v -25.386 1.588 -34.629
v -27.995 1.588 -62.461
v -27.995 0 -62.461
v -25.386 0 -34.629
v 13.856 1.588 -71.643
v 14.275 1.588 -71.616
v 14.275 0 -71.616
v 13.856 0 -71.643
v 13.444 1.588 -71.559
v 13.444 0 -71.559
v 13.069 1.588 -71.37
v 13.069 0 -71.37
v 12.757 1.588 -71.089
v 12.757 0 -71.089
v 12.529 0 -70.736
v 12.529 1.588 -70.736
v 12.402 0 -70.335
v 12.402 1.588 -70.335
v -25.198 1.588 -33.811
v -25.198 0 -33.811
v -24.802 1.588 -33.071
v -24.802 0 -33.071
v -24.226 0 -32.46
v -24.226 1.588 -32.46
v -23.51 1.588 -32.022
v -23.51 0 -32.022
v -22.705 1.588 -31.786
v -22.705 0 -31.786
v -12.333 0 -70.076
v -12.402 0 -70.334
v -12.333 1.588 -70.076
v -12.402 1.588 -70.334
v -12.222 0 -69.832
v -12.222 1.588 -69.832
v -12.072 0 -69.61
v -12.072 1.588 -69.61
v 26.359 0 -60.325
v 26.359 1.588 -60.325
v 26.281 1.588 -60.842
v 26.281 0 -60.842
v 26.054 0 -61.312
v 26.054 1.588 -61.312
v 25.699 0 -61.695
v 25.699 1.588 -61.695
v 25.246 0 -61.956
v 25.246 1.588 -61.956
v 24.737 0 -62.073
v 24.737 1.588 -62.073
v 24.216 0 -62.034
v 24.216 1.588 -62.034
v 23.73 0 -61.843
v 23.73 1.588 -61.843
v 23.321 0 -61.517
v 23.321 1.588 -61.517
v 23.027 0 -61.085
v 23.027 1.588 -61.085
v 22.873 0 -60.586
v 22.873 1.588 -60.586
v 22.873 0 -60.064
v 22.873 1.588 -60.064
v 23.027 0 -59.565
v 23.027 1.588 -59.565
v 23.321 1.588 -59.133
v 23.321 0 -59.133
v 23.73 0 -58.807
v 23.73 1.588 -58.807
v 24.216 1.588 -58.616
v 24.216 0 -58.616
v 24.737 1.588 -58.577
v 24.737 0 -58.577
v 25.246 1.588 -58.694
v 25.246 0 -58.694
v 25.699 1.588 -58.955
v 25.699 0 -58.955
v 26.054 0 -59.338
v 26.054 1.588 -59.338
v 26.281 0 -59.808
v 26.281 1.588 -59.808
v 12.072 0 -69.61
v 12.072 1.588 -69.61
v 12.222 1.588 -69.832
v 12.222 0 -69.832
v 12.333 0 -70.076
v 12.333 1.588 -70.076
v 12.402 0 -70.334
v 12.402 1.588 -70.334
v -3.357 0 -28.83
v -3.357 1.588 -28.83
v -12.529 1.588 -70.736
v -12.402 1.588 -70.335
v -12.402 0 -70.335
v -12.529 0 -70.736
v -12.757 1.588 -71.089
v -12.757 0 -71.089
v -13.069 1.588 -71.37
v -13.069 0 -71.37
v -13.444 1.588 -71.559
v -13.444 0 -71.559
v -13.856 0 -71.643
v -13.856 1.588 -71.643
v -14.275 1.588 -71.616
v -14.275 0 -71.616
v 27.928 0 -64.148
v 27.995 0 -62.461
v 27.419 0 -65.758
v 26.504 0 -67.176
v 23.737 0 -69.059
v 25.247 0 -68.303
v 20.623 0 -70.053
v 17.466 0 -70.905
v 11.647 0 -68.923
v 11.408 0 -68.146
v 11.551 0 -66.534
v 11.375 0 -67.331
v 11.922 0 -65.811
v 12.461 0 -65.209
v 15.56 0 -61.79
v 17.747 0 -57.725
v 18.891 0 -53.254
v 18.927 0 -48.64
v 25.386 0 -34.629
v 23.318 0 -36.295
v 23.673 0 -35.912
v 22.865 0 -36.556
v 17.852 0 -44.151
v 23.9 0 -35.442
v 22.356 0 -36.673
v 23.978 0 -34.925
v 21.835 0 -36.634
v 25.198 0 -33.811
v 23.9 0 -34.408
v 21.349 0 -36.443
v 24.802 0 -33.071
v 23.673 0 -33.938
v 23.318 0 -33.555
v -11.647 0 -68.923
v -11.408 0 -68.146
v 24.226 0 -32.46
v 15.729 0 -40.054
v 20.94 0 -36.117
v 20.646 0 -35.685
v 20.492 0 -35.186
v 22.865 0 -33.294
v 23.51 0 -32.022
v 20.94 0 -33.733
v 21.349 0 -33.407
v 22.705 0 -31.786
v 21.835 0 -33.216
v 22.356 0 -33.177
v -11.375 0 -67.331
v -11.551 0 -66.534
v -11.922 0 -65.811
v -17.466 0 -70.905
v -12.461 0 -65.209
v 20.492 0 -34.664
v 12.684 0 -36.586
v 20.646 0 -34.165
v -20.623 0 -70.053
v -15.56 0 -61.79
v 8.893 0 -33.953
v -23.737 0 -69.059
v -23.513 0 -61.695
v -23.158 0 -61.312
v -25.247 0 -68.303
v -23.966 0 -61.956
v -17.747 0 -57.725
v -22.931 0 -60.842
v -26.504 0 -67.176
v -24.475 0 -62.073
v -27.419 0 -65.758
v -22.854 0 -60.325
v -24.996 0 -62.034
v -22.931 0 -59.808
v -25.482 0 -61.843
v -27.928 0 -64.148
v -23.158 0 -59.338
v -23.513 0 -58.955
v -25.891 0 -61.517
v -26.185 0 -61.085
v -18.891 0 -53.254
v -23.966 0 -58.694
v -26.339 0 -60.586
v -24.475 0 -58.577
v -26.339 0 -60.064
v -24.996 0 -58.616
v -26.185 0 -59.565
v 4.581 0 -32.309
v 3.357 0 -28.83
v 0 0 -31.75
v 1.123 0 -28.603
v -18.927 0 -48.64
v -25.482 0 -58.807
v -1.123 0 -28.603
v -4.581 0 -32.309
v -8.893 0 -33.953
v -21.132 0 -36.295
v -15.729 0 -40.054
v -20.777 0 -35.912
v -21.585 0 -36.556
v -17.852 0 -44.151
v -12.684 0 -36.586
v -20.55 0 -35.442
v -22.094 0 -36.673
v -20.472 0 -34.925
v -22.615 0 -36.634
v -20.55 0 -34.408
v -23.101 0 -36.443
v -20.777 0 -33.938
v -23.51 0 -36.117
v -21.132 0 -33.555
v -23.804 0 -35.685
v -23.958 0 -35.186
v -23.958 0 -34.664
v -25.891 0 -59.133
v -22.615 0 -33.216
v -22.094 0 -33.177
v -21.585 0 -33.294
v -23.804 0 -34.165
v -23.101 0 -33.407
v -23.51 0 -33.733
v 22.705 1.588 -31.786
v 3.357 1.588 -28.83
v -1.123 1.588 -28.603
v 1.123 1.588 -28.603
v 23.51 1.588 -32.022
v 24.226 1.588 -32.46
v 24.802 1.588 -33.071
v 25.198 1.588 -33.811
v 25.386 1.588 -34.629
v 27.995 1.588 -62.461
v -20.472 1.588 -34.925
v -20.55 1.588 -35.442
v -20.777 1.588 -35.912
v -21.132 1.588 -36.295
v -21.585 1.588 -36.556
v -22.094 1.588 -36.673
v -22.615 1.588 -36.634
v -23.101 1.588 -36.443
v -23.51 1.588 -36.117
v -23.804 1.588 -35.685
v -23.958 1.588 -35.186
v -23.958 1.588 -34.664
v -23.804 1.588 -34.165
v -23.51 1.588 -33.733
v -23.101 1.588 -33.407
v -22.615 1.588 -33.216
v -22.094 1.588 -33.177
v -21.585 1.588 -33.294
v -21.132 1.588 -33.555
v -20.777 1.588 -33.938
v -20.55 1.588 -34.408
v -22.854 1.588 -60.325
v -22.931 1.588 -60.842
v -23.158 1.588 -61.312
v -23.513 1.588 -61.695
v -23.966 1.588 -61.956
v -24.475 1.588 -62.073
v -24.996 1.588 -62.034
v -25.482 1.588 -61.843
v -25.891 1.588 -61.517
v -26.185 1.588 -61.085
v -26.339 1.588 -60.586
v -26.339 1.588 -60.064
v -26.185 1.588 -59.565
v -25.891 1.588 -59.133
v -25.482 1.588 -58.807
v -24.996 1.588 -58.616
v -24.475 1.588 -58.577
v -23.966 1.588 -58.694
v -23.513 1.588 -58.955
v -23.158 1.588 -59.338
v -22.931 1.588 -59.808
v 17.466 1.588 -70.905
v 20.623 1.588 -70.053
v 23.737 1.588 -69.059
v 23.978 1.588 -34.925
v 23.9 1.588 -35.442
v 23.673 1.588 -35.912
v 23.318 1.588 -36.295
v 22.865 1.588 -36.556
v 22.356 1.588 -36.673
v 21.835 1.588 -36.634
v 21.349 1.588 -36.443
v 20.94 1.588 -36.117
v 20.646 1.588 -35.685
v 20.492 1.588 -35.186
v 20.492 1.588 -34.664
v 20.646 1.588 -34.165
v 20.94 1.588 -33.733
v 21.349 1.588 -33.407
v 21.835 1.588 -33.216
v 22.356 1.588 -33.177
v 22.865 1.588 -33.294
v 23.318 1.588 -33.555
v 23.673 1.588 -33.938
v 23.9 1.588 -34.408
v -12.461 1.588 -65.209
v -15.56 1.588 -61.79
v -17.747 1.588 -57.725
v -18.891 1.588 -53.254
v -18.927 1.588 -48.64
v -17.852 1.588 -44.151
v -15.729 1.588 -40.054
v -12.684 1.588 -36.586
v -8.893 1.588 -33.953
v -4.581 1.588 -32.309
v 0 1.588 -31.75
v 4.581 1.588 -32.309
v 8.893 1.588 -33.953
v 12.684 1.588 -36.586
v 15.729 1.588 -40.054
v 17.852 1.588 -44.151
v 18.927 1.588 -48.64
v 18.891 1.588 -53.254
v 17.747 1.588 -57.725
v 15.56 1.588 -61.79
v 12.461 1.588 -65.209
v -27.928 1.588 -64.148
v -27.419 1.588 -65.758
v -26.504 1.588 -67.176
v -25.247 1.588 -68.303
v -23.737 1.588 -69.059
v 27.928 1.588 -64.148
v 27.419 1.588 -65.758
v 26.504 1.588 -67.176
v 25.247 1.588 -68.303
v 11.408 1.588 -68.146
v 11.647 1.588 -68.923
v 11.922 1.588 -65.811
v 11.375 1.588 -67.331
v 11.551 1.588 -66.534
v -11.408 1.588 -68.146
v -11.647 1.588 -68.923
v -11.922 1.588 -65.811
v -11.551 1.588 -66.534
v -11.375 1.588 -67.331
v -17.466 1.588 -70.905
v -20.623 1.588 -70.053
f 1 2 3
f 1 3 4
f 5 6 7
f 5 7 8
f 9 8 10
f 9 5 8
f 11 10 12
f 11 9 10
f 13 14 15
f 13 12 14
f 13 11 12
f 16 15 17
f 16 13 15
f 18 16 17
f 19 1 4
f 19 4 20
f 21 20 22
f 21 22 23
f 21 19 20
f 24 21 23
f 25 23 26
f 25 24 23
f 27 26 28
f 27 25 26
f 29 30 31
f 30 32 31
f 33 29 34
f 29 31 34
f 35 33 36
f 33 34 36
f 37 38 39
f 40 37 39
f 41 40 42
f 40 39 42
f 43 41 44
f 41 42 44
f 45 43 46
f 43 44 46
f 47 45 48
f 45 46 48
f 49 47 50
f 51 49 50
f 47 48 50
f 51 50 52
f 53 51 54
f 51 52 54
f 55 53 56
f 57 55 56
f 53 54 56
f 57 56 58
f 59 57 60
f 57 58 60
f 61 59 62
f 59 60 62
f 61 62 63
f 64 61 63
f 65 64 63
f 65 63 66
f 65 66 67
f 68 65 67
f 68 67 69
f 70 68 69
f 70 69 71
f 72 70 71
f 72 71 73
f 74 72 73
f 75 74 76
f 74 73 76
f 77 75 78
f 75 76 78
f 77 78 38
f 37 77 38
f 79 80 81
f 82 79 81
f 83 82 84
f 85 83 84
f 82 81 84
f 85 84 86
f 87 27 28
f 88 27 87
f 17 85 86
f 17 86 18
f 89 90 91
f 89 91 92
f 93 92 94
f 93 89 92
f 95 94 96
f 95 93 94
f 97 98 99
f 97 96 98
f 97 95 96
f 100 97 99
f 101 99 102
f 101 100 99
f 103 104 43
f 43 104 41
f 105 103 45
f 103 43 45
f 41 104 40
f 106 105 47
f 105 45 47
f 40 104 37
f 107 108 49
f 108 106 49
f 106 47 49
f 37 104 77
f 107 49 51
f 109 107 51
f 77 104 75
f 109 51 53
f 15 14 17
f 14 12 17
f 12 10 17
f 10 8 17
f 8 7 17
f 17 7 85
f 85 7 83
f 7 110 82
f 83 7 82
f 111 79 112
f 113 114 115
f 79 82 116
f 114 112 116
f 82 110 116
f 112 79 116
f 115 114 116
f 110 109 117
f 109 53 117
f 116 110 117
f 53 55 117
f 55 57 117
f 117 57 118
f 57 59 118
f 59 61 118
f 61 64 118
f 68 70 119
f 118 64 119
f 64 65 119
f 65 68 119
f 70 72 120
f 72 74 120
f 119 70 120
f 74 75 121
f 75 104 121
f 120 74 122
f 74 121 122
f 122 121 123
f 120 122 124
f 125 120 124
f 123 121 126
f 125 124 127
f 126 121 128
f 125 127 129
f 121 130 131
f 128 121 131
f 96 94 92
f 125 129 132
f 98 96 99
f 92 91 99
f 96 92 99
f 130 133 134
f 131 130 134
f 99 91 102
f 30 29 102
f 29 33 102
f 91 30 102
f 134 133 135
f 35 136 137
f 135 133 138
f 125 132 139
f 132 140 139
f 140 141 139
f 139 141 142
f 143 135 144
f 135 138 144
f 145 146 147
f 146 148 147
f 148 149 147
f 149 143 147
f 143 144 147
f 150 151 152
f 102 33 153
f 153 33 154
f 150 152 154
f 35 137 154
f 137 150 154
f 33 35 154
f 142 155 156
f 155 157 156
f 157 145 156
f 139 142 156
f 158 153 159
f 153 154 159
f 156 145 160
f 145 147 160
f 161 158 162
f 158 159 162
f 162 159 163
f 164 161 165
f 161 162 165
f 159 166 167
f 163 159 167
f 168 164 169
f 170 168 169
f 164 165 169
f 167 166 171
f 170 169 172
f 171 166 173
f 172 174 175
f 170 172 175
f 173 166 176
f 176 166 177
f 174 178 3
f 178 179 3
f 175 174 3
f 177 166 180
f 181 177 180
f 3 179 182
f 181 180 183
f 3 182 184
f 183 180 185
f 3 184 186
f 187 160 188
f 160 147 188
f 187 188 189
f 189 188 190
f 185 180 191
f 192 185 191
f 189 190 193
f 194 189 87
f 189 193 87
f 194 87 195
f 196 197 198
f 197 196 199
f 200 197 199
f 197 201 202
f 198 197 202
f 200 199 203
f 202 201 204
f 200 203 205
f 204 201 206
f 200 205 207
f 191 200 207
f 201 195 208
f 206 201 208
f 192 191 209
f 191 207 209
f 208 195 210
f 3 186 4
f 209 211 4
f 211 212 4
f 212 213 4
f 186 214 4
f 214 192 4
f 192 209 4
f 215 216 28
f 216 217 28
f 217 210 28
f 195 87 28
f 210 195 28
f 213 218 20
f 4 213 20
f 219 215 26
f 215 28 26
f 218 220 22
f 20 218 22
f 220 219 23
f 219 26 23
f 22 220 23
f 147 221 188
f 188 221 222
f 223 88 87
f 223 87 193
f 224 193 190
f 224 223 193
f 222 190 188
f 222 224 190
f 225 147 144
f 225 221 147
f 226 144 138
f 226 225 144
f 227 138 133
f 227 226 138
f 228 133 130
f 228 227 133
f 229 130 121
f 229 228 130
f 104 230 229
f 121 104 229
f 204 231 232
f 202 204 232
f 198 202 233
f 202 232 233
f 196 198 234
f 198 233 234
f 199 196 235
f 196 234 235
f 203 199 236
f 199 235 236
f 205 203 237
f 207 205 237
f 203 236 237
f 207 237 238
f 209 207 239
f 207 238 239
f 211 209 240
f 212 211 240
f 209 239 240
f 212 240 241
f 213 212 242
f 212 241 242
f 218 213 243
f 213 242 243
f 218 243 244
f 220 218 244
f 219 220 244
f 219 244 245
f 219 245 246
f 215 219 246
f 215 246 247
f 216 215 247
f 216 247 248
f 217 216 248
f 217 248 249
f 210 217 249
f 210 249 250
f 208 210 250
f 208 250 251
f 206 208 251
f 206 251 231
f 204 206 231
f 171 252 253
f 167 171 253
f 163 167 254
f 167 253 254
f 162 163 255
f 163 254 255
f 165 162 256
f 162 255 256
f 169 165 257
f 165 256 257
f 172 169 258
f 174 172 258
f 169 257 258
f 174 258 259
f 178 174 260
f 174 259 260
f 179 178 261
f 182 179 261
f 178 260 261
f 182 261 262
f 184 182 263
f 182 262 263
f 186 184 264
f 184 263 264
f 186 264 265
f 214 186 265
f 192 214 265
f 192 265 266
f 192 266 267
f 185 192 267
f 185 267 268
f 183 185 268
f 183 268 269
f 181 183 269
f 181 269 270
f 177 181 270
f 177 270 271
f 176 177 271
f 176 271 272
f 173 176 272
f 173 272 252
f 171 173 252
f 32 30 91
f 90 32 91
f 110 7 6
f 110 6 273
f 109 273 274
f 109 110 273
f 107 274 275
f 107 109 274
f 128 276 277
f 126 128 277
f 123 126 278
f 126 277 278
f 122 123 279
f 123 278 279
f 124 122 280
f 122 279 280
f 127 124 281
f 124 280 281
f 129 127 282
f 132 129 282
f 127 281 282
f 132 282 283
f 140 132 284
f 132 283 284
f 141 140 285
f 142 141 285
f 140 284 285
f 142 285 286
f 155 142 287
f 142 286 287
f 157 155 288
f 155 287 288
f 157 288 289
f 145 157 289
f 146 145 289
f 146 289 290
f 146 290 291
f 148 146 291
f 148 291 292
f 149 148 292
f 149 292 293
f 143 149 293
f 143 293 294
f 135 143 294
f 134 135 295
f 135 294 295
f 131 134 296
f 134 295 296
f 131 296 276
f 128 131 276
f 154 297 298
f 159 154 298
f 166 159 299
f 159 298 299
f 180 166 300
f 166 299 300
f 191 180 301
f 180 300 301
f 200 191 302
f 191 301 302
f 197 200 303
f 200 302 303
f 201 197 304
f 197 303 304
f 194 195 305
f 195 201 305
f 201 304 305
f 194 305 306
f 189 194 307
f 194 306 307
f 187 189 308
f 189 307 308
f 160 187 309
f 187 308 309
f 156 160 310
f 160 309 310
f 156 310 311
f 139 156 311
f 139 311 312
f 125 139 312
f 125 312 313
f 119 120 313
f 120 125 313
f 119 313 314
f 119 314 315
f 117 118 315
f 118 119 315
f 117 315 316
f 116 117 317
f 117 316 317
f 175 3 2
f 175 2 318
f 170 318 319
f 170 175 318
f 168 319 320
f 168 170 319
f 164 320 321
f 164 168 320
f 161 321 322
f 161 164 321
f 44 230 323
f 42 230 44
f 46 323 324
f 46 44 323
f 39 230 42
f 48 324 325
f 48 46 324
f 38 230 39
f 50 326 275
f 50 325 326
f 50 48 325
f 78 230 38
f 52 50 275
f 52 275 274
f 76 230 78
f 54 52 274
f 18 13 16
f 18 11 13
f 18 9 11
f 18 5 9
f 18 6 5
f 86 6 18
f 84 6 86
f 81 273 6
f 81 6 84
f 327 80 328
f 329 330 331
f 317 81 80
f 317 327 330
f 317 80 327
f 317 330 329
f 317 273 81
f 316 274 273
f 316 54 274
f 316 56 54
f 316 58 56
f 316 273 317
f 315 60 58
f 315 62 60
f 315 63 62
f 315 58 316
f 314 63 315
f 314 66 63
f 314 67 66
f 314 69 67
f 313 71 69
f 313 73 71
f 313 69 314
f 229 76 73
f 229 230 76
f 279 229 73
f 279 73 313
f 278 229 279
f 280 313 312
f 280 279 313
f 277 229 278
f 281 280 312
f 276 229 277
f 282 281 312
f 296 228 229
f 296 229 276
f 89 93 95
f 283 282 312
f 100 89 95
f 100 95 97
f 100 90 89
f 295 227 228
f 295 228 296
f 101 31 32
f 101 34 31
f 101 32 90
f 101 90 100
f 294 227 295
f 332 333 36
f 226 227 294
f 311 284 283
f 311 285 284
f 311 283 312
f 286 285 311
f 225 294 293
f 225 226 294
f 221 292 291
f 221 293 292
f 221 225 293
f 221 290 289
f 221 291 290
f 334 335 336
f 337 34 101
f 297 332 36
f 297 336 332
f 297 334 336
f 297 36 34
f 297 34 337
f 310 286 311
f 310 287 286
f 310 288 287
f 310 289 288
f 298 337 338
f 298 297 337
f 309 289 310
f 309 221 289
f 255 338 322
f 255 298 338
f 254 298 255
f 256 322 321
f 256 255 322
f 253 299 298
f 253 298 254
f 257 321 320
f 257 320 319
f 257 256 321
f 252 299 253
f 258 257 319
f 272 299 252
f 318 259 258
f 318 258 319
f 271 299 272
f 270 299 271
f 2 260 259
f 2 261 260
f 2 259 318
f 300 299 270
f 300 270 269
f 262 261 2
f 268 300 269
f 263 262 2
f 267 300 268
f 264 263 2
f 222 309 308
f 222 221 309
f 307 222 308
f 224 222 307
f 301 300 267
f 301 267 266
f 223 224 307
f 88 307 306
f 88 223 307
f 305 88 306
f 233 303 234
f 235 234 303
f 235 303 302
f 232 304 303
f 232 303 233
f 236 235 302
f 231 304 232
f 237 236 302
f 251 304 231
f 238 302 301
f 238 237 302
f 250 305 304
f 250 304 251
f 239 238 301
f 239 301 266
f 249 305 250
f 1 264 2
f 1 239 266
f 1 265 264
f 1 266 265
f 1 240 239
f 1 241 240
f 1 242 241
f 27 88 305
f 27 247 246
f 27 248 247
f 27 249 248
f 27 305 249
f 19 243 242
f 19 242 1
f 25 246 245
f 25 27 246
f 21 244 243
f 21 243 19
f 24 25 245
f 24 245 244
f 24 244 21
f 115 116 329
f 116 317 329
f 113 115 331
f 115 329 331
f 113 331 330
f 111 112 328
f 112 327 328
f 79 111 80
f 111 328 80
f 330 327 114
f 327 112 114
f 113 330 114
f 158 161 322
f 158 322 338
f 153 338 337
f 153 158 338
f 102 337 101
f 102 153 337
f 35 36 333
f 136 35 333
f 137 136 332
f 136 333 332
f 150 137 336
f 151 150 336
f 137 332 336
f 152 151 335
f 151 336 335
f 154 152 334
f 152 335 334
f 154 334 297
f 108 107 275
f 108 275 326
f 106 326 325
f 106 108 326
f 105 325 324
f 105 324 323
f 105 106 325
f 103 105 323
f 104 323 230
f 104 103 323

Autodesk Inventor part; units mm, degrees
ref_plane "YZ Plane" through (0, 0, 0) normal (1, 0, 0) x (0, 1, 0)
ref_plane "XZ Plane" through (0, 0, 0) normal (0, 1, 0) x (-1, 0, 0)
ref_plane "XY Plane" through (0, 0, 0) normal (0, 0, 1) x (1, 0, 0)
sketch "Sketch1" plane through (0, 0, 0) normal (0, 1, 0) x (-1, 0, 0)
  circle A0 centre (0, 0) radius 73.025
  line L0 (0, 0) -> (0, -73.025) construction
  line L1 (0, 0) -> (-12.6807, -71.9156)
  line L2 (0, 0) -> (12.6807, -71.9156)
  line L3 (0, 0) -> (72.3143, -10.1631)
  line L4 (0, 0) -> (64.4772, -34.2832)
  line L5 (0, 0) -> (32.0121, 65.6344)
  line L6 (0, 0) -> (52.5298, 50.7274)
  line L7 (0, 0) -> (-52.5298, 50.7274)
  line L8 (0, 0) -> (-32.0121, 65.6344)
  line L9 (0, 0) -> (-64.4772, -34.2832)
  line L10 (0, 0) -> (-72.3143, -10.1631)
  circle A1 centre (0, 0) radius 69.85
  arc A2 (4.7597, -69.6876) -> (-4.7597, -69.6876) centre (0, -69.85) ccw
  arc A3 (67.7477, -17.0079) -> (64.806, -26.0614) centre (66.4313, -21.5848) ccw
  arc A4 (37.1107, 59.1762) -> (44.8121, 53.5808) centre (41.0568, 56.5098) ccw
  arc A5 (-44.8121, 53.5808) -> (-37.1107, 59.1762) centre (-41.0568, 56.5098) ccw
  arc A6 (-64.806, -26.0614) -> (-67.7477, -17.0079) centre (-66.4313, -21.5848) ccw
  point P0 (61.6739, -32.7926)
  point P1 (69.1702, -9.7212)
  point P2 (50.2459, 48.5219)
  point P3 (30.6202, 62.7808)
  point P4 (-30.6202, 62.7808)
  point P5 (-50.2459, 48.5219)
  point P6 (-69.1702, -9.7212)
  point P7 (-61.6739, -32.7926)
  point P8 (-12.1293, -68.7888)
  point P9 (12.1293, -68.7888)
  point P10 (64.806, -26.0614)
  point P11 (67.7477, -17.0079)
  point P12 (44.8121, 53.5808)
  point P13 (37.1107, 59.1762)
  point P14 (-37.1107, 59.1762)
  point P15 (-67.7477, -17.0079)
  dimension "d0" = 146.05
  dimension "d1" = 10
  dimension "d4" = 360
  dimension "d6" = 3.175
  dimension "d10" = 9.525
  dimension "d13" = 360
extrude "Extrusion1" add sketch "Sketch1" along normal blind 1.5875 contours A0 L3 A1 L6 | L5 A1 L8 A0 | A1 L3 L6 | L6 L5 A1 A4 | A0 L2 A1 L4 | A1 A3 L4 L3 | L5 L8 A1 | L2 A1 A2 L1 | L4 A1 L2 | L10 A1 L7 | L7 A1 A5 L8 | L1 A1 L9 | L9 A1 A6 L10 | L7 A1 L10 A0 | L1 A0 L9 A1
fillet "Fillet1" radius 1.5875 30 edges at (30.6202, 0.7937, 62.7808) (32.0121, 0.7937, 65.6344) (-30.6202, 0.7937, 62.7808) (-32.0121, 0.7937, 65.6344) (-52.5298, 0.7937, 50.7274) (-50.2459, 0.7937, 48.5219) (52.5298, 0.7937, 50.7274) (50.2459, 0.7937, 48.5219) (64.4772, 0.7937, -34.2832) (61.6739, 0.7937, -32.7926) (72.3143, 0.7937, -10.1631) (69.1702, 0.7937, -9.7212) (12.6807, 0.7937, -71.9156) (12.1293, 0.7937, -68.7888) (-12.6807, 0.7937, -71.9156) (-12.1293, 0.7937, -68.7888) (-72.3143, 0.7937, -10.1631) (-69.1702, 0.7937, -9.7212) (-64.4772, 0.7937, -34.2832) (-61.6739, 0.7937, -32.7926) (37.1107, 0.7937, 59.1762) (44.8121, 0.7937, 53.5808) (-44.8121, 0.7937, 53.5808) (-37.1107, 0.7937, 59.1762) (-64.806, 0.7937, -26.0614) (-67.7477, 0.7937, -17.0079) (4.7597, 0.7937, -69.6876) (-4.7597, 0.7937, -69.6876) (67.7477, 0.7937, -17.0079) (64.806, 0.7937, -26.0614)
sketch "Sketch5" plane through (0, 1.5875, 0) normal (0, 1, 0) x (1, 0, 0)
  line L0 (0, 0) -> (0, 65.0875) construction
  arc A0 (-4.554, 68.4564) -> (4.554, 68.4564) centre (0, 69.85) ccw projected
  circle A1 centre (0, 50.8) radius 22.225
  arc A2 (63.6995, 35.7075) -> (14.2757, 71.616) centre (0, 0) ccw projected
  circle A3 centre (-24.6062, 60.325) radius 1.7526
  circle A4 centre (-24.6062, 60.325) radius 3.175 construction
  circle A5 centre (-22.225, 34.925) radius 3.175
  circle A6 centre (-22.225, 34.925) radius 1.7526
  circle A7 centre (24.6062, 60.325) radius 1.7526
  circle A8 centre (24.6062, 60.325) radius 3.175
  circle A9 centre (22.225, 34.925) radius 3.175
  circle A10 centre (22.225, 34.925) radius 1.7526
  arc A11 (6.2133, 69.5731) -> (4.554, 68.4564) centre (6.0721, 67.9919) ccw projected
  arc A12 (6.2133, 69.5731) -> (4.554, 68.4564) centre (6.0721, 67.9919) ccw
  arc A13 (-4.554, 68.4564) -> (-6.2133, 69.5731) centre (-6.0721, 67.9919) ccw projected
  arc A14 (-4.554, 68.4564) -> (-6.2133, 69.5731) centre (-6.0721, 67.9919) ccw
  arc A15 (-12.4019, 70.3348) -> (-10.5977, 69.0414) centre (-10.8385, 70.6105) ccw projected
  arc A16 (10.5977, 69.0414) -> (12.4019, 70.3348) centre (10.8385, 70.6105) ccw projected
  arc A17 (10.5977, 69.0414) -> (6.2133, 69.5731) centre (0, 0) ccw projected
  arc A18 (10.5977, 69.0414) -> (11.9875, 69.515) centre (10.8385, 70.6105) ccw
  arc A19 (-6.2133, 69.5731) -> (-10.5977, 69.0414) centre (0, 0) ccw
  arc A20 (-14.2757, 71.616) -> (-63.6995, 35.7075) centre (0, 0) ccw projected
  line L1 (-28.4451, 67.2572) -> (-25.3861, 34.6286)
  line L2 (-22.7046, 31.7864) -> (-3.3572, 28.83)
  line L3 (28.4451, 67.2572) -> (25.3861, 34.6286)
  line L4 (22.7046, 31.7864) -> (3.3572, 28.83)
  circle A21 centre (0, 0) radius 73.025
  circle A22 centre (0, 50.8) radius 19.05
  point P0 (-63.6995, 35.7075)
  point P1 (-9.2869, 69.2299)
  point P2 (9.2869, 69.2299)
  point P3 (-5.0165, 69.1776)
  point P4 (5.0165, 69.1776)
  dimension "d40" = 44.45
  dimension "d41" = 3.5052
  dimension "d42" = 6.35
  dimension "d43" = 9.525
  dimension "d44" = 24.6062
  dimension "d45" = 6.35
  dimension "d46" = 3.5052
  dimension "d47" = 15.875
  dimension "d48" = 22.225
  dimension "d70" = 38.1
extrude "Extrusion3" cut sketch "Sketch5" against normal blind 25.4 contours A13 A22 A11 A0 | A0 A11 A22 A13 | A1 L4 A9 L3 A2 A21 A20 L1 A5 L2 | A3 | A6 | A7 | A10
fillet "Fillet4" radius 6.35 2 edges at (-28.4451, 0.7937, -67.2572) (28.4451, 0.7937, -67.2572)
fillet "Fillet5" radius 3.175 2 edges at (-5.0163, 0.7937, -69.1777) (5.0163, 0.7937, -69.1777)
equation "\"d45\" = d42"
equation "\"d46\" = d41"
properties part number "Top Plate" material "Aluminum 6061"
